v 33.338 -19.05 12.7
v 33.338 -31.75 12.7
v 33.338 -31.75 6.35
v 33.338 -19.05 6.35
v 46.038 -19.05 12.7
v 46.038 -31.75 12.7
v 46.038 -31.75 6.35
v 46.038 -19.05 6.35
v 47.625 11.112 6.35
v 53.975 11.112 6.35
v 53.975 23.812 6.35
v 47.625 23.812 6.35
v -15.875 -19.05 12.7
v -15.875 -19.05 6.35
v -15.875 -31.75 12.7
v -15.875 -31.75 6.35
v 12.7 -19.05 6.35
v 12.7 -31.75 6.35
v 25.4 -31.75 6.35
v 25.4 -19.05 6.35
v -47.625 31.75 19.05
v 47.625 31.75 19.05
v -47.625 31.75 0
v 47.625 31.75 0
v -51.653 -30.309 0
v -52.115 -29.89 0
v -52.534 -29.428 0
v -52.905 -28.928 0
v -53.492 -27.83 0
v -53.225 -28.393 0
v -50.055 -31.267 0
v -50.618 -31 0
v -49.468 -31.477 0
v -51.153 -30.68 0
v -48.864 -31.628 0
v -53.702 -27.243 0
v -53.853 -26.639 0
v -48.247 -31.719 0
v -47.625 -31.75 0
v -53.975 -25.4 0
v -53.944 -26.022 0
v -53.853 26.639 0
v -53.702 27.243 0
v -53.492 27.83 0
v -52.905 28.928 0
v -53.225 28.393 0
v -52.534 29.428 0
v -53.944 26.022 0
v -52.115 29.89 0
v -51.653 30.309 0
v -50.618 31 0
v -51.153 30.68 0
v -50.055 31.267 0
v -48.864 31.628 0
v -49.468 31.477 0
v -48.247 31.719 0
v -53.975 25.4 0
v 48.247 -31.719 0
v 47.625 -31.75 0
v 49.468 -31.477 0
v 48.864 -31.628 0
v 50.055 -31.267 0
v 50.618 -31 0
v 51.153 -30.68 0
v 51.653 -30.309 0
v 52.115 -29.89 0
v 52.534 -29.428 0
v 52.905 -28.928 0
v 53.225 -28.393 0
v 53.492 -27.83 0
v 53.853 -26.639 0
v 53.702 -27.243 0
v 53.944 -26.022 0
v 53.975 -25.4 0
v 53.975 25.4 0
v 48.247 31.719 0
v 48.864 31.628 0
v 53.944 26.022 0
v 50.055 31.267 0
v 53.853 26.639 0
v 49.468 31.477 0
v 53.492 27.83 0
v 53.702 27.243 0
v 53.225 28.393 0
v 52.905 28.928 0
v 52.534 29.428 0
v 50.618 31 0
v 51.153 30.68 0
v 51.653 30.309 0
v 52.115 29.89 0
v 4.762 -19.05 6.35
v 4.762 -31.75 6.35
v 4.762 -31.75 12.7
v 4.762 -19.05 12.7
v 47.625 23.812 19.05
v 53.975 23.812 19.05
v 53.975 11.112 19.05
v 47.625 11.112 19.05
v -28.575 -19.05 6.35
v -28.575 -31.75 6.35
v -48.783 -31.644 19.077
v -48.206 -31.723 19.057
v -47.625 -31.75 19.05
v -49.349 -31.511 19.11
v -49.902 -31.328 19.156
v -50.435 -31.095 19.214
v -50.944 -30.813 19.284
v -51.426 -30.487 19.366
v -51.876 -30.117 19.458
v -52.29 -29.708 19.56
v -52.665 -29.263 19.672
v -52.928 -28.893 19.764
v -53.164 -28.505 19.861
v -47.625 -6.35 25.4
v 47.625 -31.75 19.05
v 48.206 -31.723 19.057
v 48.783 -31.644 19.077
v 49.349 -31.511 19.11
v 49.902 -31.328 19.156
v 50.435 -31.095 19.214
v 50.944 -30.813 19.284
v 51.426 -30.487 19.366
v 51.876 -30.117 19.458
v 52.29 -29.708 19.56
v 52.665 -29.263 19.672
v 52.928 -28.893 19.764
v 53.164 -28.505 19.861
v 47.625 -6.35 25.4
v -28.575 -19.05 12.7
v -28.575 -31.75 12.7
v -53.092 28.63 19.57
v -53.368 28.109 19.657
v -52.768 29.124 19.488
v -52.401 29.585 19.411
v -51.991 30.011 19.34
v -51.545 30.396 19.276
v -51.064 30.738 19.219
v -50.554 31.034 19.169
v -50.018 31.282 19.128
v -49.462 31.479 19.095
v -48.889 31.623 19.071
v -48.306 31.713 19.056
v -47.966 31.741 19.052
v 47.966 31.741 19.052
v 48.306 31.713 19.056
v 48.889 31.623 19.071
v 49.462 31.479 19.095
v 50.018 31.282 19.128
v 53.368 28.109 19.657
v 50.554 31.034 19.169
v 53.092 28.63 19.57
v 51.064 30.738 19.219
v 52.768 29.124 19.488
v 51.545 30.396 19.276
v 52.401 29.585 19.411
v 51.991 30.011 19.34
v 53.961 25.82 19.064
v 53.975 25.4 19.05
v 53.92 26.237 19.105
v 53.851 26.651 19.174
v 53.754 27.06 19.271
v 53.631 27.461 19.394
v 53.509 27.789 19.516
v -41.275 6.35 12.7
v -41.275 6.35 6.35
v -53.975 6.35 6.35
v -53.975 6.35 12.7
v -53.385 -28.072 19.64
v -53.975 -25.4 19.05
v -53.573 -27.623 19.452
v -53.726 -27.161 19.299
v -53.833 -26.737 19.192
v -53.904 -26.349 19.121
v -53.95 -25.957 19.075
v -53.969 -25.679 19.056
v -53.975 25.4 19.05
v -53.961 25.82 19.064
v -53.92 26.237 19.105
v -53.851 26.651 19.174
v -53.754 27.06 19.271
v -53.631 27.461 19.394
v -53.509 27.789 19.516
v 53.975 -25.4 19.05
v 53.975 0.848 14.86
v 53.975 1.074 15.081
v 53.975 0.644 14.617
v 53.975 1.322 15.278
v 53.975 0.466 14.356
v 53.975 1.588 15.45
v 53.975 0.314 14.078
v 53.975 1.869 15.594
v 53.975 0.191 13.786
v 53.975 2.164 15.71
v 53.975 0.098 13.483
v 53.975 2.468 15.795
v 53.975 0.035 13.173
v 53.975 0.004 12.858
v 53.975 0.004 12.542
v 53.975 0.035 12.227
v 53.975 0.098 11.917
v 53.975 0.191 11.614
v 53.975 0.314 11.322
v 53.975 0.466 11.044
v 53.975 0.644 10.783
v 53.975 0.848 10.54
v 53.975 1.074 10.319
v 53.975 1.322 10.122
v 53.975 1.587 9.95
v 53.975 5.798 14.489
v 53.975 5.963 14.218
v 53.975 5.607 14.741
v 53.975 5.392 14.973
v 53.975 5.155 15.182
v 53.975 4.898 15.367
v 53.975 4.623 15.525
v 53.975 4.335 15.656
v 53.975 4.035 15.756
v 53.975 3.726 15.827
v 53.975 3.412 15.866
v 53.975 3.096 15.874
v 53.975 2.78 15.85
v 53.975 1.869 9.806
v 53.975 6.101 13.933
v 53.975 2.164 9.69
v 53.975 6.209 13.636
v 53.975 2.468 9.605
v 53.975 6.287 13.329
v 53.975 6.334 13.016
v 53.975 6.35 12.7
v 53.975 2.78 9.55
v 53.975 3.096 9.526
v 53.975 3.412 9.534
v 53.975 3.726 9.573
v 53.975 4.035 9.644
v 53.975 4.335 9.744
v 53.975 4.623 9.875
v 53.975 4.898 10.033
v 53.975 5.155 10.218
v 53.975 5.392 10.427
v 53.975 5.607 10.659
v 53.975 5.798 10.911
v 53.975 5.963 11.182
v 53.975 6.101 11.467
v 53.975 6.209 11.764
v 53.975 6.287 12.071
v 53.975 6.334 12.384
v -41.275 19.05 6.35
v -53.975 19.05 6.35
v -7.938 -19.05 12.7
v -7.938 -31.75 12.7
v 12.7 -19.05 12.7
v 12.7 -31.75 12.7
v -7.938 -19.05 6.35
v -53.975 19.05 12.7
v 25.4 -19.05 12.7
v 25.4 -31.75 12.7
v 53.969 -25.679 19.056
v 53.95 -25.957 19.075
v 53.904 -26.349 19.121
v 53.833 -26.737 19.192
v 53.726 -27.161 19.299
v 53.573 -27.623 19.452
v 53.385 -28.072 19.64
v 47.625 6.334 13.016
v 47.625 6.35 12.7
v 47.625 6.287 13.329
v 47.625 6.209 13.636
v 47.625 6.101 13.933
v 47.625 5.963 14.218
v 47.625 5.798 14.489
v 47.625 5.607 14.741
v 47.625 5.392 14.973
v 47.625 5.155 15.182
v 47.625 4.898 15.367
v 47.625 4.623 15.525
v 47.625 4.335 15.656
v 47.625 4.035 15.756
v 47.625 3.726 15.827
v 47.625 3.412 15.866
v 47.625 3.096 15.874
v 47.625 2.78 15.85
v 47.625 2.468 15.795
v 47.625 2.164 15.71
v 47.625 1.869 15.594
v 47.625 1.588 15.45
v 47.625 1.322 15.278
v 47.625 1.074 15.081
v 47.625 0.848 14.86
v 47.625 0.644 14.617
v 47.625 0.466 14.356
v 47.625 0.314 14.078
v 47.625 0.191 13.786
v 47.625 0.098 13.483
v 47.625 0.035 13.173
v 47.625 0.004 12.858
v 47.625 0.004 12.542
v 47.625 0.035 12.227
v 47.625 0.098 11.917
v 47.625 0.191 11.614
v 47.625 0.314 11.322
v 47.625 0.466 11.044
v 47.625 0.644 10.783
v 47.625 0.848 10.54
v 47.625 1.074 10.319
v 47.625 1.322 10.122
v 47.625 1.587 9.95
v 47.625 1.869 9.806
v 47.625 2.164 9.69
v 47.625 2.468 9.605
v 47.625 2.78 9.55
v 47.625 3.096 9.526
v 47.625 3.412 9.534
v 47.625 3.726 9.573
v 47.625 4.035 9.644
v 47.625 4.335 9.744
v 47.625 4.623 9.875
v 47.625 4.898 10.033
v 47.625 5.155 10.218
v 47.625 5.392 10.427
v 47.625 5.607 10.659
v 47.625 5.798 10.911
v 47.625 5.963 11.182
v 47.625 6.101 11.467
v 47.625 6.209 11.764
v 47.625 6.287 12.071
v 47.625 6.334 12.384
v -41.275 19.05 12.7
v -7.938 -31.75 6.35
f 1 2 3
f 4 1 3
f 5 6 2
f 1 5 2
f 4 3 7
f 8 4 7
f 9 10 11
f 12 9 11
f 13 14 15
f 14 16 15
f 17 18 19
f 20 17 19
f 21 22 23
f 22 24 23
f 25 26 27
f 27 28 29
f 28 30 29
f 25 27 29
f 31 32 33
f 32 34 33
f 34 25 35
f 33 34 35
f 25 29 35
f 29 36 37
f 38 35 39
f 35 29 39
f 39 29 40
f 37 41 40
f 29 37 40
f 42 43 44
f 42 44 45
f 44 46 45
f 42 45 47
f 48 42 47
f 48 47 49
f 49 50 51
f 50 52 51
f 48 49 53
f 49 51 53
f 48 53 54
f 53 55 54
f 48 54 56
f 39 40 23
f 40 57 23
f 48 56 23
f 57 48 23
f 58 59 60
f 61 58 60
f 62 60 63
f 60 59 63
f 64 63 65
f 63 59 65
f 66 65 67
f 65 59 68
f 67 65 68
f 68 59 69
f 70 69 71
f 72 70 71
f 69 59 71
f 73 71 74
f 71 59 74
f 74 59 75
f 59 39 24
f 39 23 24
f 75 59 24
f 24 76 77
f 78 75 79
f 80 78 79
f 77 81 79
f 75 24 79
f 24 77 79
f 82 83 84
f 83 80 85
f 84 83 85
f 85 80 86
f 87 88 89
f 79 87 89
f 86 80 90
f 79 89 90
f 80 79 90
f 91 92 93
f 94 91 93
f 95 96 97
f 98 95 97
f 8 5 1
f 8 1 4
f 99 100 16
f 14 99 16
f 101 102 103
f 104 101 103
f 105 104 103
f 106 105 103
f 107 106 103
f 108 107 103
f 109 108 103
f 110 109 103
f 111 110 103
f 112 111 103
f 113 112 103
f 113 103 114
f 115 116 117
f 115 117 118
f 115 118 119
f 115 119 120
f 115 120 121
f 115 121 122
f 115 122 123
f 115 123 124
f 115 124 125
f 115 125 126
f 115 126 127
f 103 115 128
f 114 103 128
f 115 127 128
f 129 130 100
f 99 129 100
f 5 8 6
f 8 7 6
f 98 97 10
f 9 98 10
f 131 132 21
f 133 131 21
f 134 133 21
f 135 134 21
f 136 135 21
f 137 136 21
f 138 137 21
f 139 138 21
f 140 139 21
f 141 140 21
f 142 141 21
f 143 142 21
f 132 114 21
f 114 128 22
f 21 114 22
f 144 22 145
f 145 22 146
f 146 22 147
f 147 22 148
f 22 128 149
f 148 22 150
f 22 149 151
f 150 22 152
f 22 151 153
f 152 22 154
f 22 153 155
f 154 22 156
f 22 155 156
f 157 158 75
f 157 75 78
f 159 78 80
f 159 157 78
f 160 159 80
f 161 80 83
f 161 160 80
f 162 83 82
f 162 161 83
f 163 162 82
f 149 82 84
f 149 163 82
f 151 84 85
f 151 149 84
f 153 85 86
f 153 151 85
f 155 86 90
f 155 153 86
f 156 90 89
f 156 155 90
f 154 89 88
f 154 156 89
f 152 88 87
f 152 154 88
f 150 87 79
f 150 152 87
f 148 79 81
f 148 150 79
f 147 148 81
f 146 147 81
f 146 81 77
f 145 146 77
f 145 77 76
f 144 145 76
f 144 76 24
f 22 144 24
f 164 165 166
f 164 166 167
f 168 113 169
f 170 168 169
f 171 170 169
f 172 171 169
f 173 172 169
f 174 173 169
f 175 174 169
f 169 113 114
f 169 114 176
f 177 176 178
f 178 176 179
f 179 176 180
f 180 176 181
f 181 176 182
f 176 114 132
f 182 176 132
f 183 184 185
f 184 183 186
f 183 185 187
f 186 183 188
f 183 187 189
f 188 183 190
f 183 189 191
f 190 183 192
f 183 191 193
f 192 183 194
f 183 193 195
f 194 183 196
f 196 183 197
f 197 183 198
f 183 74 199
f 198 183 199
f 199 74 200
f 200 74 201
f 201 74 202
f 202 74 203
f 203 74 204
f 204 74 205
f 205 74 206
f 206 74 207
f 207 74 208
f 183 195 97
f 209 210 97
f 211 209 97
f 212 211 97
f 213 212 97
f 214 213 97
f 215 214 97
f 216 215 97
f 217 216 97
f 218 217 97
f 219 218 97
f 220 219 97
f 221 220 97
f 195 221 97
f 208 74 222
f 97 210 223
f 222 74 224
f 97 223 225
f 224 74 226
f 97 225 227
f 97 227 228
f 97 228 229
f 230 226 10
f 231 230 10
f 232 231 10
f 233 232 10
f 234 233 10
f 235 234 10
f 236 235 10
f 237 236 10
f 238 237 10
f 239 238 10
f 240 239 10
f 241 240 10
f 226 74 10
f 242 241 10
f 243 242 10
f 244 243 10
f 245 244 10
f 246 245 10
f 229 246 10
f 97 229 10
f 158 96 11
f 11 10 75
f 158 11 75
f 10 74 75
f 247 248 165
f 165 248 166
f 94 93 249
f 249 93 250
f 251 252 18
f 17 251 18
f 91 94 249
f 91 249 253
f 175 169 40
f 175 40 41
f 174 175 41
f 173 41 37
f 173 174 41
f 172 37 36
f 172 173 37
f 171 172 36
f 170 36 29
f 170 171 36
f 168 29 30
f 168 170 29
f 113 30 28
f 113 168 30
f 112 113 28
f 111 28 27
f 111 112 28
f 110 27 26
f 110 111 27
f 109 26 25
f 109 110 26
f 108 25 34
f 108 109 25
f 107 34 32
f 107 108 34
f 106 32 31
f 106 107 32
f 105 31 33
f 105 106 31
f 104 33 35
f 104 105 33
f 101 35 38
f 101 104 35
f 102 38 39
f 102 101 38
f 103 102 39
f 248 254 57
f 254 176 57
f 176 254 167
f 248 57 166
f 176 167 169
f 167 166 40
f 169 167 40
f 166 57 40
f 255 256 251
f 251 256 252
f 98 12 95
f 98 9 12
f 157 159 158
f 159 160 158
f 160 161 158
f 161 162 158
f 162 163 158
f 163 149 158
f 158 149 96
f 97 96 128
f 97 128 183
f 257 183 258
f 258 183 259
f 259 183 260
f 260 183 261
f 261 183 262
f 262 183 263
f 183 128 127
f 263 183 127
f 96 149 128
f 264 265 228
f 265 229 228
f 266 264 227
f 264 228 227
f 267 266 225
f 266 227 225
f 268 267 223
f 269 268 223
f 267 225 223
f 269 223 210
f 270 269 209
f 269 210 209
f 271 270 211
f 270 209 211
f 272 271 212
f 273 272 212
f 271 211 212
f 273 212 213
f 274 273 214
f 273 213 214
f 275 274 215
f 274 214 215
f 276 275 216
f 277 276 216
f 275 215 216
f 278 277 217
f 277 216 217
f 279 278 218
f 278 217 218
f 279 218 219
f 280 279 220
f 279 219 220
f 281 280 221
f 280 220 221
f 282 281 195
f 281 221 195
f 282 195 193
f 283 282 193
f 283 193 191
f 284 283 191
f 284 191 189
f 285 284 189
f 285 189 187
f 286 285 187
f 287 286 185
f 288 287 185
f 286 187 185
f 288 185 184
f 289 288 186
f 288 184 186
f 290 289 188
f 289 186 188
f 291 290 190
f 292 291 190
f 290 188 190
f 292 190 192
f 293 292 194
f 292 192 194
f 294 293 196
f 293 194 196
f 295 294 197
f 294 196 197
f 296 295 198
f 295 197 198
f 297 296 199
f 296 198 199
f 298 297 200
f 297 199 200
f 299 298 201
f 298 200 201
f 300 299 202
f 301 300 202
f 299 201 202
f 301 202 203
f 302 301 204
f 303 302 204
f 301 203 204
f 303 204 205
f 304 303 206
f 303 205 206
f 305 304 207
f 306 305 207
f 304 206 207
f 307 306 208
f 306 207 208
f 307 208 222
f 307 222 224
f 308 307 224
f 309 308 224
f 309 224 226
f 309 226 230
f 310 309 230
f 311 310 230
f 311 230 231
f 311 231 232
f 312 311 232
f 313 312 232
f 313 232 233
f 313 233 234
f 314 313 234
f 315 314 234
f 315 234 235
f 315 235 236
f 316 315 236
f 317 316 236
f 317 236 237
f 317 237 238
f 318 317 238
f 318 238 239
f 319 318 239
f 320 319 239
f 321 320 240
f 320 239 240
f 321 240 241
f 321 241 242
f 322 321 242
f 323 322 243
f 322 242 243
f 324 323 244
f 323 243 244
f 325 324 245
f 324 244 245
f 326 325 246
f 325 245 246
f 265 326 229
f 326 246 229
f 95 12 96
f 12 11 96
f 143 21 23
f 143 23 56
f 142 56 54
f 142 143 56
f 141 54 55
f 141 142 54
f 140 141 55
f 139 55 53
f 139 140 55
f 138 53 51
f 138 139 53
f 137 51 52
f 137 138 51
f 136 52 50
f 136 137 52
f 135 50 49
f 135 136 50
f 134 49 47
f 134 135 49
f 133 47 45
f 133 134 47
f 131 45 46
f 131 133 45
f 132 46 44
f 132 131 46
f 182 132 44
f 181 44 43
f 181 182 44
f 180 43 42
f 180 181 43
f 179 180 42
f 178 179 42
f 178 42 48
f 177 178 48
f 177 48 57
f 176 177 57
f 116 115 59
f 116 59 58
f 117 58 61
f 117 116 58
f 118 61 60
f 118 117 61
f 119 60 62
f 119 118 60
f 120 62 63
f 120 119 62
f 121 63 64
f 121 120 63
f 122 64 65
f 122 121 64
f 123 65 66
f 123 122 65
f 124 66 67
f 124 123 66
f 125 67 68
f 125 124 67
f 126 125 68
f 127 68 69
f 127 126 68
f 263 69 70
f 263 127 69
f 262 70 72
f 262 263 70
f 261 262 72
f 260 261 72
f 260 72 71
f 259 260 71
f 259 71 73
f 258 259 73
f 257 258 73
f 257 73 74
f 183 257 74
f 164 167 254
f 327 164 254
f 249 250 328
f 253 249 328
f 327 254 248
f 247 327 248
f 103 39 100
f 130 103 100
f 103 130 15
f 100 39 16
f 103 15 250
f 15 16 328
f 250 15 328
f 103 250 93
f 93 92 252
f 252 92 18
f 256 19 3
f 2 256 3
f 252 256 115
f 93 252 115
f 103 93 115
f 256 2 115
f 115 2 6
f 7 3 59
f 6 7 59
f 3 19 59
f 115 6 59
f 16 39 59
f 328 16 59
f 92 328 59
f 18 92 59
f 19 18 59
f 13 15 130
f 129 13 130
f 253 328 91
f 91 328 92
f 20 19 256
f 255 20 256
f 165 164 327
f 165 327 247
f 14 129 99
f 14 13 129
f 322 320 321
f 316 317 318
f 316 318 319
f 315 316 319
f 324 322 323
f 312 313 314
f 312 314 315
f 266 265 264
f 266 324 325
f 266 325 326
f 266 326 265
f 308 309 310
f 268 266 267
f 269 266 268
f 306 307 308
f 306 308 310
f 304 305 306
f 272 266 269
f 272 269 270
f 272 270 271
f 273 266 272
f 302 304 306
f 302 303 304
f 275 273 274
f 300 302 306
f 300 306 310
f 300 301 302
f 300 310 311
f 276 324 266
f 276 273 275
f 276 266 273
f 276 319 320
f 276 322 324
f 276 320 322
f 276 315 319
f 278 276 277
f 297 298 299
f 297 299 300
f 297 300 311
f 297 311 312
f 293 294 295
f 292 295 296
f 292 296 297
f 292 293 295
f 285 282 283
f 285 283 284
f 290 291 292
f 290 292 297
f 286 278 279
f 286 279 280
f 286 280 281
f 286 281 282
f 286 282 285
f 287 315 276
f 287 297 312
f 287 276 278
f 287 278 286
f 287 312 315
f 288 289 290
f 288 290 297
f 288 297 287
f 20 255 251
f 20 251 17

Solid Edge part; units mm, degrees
sketch "Sketch1" plane through (0, 0, 0) normal (0, 0, 1) x (1, 0, 0)
  line L0 (-53.975, -31.75) -> (53.975, -31.75)
  line L1 (53.975, -31.75) -> (53.975, 31.75)
  line L2 (53.975, 31.75) -> (-53.975, 31.75)
  line L3 (-53.975, 31.75) -> (-53.975, -31.75)
  dimension "D1" = 107.95
  dimension "D2" = 63.5
extrude "Protrusion1" add sketch "Sketch1" along normal blind 25.4
chamfer "Chamfer_1" distance 6.35 angle 45 2 edges at (-53.975, 0, 25.4) (53.975, 0, 25.4)
sketch "Sketch2" plane through (53.975, 0, 9.525) normal (1, 0, 0) x (0, 1, 0)
  line L0 (-6.35, 15.875) -> (-31.75, 15.875)
  line L1 (-31.75, 15.875) -> (-31.75, 9.525)
  line L2 (-31.75, 9.525) -> (-6.35, 15.875)
  line L3 (31.75, 15.875) -> (-6.35, 15.875)
  line L4 (-6.35, 15.875) -> (31.75, 9.525)
  line L5 (31.75, 9.525) -> (31.75, 15.875)
  dimension "D1" = 25.4
extrude "Cutout1" cut sketch "Sketch2" against normal through all
fillet "Round_1" radius 6.35 4 edges at (53.975, -31.75, 9.525) (53.975, 31.75, 9.525) (-53.975, 31.75, 9.525) (-53.975, -31.75, 9.525)
sketch "Sketch3" plane through (-53.975, 0, 9.525) normal (-1, 0, 0) x (0, -1, 0)
  line L0 (-19.05, -3.175) -> (-6.35, -3.175)
  line L1 (-6.35, -3.175) -> (-6.35, 3.175)
  line L2 (-6.35, 3.175) -> (-19.05, 3.175)
  line L3 (-19.05, 3.175) -> (-19.05, -3.175)
  dimension "D1" = 12.7
  dimension "D2" = 6.35
  dimension "D3" = 12.7
  dimension "D4" = 6.35
extrude "ExtrudedCutout_3" cut sketch "Sketch3" against normal blind 12.7
sketch "Sketch4" plane through (0, -31.75, 9.525) normal (0, -1, 0) x (1, 0, 0)
  line L0 (-28.575, -3.175) -> (-15.875, -3.175)
  line L1 (-15.875, -3.175) -> (-15.875, 3.175)
  line L2 (-15.875, 3.175) -> (-28.575, 3.175)
  line L3 (-28.575, 3.175) -> (-28.575, -3.175)
  line L4 (-7.9375, -3.175) -> (4.7625, -3.175)
  line L5 (4.7625, -3.175) -> (4.7625, 3.175)
  line L6 (4.7625, 3.175) -> (-7.9375, 3.175)
  line L7 (-7.9375, 3.175) -> (-7.9375, -3.175)
  line L8 (12.7, -3.175) -> (25.4, -3.175)
  line L9 (25.4, -3.175) -> (25.4, 3.175)
  line L10 (25.4, 3.175) -> (12.7, 3.175)
  line L11 (12.7, 3.175) -> (12.7, -3.175)
  line L12 (33.3375, -3.175) -> (46.0375, -3.175)
  line L13 (46.0375, -3.175) -> (46.0375, 3.175)
  line L14 (46.0375, 3.175) -> (33.3375, 3.175)
  line L15 (33.3375, 3.175) -> (33.3375, -3.175)
  dimension "D1" = 6.35
  dimension "D2" = 7.9375
  dimension "D3" = 7.9375
  dimension "D4" = 12.7
  dimension "D5" = 6.35
  dimension "D6" = 7.9375
  dimension "D7" = 7.9375
extrude "ExtrudedCutout_4" cut sketch "Sketch4" against normal blind 12.7
sketch "Sketch5" plane through (53.975, 0, 9.525) normal (1, 0, 0) x (0, 1, 0)
  circle A0 centre (3.175, 3.175) radius 3.175
  line L0 (11.1125, -3.175) -> (23.8125, -3.175)
  line L1 (23.8125, -3.175) -> (23.8125, 9.525)
  line L2 (23.8125, 9.525) -> (11.1125, 9.525)
  line L3 (11.1125, 9.525) -> (11.1125, -3.175)
  dimension "D1" = 12.7
  dimension "D2" = 34.925
  dimension "D3" = 12.7
  dimension "D4" = 12.7
  dimension "D5" = 7.9375
extrude "ExtrudedCutout_5" cut sketch "Sketch5" against normal blind 6.35
properties material "ABS Plastic, high impact"
